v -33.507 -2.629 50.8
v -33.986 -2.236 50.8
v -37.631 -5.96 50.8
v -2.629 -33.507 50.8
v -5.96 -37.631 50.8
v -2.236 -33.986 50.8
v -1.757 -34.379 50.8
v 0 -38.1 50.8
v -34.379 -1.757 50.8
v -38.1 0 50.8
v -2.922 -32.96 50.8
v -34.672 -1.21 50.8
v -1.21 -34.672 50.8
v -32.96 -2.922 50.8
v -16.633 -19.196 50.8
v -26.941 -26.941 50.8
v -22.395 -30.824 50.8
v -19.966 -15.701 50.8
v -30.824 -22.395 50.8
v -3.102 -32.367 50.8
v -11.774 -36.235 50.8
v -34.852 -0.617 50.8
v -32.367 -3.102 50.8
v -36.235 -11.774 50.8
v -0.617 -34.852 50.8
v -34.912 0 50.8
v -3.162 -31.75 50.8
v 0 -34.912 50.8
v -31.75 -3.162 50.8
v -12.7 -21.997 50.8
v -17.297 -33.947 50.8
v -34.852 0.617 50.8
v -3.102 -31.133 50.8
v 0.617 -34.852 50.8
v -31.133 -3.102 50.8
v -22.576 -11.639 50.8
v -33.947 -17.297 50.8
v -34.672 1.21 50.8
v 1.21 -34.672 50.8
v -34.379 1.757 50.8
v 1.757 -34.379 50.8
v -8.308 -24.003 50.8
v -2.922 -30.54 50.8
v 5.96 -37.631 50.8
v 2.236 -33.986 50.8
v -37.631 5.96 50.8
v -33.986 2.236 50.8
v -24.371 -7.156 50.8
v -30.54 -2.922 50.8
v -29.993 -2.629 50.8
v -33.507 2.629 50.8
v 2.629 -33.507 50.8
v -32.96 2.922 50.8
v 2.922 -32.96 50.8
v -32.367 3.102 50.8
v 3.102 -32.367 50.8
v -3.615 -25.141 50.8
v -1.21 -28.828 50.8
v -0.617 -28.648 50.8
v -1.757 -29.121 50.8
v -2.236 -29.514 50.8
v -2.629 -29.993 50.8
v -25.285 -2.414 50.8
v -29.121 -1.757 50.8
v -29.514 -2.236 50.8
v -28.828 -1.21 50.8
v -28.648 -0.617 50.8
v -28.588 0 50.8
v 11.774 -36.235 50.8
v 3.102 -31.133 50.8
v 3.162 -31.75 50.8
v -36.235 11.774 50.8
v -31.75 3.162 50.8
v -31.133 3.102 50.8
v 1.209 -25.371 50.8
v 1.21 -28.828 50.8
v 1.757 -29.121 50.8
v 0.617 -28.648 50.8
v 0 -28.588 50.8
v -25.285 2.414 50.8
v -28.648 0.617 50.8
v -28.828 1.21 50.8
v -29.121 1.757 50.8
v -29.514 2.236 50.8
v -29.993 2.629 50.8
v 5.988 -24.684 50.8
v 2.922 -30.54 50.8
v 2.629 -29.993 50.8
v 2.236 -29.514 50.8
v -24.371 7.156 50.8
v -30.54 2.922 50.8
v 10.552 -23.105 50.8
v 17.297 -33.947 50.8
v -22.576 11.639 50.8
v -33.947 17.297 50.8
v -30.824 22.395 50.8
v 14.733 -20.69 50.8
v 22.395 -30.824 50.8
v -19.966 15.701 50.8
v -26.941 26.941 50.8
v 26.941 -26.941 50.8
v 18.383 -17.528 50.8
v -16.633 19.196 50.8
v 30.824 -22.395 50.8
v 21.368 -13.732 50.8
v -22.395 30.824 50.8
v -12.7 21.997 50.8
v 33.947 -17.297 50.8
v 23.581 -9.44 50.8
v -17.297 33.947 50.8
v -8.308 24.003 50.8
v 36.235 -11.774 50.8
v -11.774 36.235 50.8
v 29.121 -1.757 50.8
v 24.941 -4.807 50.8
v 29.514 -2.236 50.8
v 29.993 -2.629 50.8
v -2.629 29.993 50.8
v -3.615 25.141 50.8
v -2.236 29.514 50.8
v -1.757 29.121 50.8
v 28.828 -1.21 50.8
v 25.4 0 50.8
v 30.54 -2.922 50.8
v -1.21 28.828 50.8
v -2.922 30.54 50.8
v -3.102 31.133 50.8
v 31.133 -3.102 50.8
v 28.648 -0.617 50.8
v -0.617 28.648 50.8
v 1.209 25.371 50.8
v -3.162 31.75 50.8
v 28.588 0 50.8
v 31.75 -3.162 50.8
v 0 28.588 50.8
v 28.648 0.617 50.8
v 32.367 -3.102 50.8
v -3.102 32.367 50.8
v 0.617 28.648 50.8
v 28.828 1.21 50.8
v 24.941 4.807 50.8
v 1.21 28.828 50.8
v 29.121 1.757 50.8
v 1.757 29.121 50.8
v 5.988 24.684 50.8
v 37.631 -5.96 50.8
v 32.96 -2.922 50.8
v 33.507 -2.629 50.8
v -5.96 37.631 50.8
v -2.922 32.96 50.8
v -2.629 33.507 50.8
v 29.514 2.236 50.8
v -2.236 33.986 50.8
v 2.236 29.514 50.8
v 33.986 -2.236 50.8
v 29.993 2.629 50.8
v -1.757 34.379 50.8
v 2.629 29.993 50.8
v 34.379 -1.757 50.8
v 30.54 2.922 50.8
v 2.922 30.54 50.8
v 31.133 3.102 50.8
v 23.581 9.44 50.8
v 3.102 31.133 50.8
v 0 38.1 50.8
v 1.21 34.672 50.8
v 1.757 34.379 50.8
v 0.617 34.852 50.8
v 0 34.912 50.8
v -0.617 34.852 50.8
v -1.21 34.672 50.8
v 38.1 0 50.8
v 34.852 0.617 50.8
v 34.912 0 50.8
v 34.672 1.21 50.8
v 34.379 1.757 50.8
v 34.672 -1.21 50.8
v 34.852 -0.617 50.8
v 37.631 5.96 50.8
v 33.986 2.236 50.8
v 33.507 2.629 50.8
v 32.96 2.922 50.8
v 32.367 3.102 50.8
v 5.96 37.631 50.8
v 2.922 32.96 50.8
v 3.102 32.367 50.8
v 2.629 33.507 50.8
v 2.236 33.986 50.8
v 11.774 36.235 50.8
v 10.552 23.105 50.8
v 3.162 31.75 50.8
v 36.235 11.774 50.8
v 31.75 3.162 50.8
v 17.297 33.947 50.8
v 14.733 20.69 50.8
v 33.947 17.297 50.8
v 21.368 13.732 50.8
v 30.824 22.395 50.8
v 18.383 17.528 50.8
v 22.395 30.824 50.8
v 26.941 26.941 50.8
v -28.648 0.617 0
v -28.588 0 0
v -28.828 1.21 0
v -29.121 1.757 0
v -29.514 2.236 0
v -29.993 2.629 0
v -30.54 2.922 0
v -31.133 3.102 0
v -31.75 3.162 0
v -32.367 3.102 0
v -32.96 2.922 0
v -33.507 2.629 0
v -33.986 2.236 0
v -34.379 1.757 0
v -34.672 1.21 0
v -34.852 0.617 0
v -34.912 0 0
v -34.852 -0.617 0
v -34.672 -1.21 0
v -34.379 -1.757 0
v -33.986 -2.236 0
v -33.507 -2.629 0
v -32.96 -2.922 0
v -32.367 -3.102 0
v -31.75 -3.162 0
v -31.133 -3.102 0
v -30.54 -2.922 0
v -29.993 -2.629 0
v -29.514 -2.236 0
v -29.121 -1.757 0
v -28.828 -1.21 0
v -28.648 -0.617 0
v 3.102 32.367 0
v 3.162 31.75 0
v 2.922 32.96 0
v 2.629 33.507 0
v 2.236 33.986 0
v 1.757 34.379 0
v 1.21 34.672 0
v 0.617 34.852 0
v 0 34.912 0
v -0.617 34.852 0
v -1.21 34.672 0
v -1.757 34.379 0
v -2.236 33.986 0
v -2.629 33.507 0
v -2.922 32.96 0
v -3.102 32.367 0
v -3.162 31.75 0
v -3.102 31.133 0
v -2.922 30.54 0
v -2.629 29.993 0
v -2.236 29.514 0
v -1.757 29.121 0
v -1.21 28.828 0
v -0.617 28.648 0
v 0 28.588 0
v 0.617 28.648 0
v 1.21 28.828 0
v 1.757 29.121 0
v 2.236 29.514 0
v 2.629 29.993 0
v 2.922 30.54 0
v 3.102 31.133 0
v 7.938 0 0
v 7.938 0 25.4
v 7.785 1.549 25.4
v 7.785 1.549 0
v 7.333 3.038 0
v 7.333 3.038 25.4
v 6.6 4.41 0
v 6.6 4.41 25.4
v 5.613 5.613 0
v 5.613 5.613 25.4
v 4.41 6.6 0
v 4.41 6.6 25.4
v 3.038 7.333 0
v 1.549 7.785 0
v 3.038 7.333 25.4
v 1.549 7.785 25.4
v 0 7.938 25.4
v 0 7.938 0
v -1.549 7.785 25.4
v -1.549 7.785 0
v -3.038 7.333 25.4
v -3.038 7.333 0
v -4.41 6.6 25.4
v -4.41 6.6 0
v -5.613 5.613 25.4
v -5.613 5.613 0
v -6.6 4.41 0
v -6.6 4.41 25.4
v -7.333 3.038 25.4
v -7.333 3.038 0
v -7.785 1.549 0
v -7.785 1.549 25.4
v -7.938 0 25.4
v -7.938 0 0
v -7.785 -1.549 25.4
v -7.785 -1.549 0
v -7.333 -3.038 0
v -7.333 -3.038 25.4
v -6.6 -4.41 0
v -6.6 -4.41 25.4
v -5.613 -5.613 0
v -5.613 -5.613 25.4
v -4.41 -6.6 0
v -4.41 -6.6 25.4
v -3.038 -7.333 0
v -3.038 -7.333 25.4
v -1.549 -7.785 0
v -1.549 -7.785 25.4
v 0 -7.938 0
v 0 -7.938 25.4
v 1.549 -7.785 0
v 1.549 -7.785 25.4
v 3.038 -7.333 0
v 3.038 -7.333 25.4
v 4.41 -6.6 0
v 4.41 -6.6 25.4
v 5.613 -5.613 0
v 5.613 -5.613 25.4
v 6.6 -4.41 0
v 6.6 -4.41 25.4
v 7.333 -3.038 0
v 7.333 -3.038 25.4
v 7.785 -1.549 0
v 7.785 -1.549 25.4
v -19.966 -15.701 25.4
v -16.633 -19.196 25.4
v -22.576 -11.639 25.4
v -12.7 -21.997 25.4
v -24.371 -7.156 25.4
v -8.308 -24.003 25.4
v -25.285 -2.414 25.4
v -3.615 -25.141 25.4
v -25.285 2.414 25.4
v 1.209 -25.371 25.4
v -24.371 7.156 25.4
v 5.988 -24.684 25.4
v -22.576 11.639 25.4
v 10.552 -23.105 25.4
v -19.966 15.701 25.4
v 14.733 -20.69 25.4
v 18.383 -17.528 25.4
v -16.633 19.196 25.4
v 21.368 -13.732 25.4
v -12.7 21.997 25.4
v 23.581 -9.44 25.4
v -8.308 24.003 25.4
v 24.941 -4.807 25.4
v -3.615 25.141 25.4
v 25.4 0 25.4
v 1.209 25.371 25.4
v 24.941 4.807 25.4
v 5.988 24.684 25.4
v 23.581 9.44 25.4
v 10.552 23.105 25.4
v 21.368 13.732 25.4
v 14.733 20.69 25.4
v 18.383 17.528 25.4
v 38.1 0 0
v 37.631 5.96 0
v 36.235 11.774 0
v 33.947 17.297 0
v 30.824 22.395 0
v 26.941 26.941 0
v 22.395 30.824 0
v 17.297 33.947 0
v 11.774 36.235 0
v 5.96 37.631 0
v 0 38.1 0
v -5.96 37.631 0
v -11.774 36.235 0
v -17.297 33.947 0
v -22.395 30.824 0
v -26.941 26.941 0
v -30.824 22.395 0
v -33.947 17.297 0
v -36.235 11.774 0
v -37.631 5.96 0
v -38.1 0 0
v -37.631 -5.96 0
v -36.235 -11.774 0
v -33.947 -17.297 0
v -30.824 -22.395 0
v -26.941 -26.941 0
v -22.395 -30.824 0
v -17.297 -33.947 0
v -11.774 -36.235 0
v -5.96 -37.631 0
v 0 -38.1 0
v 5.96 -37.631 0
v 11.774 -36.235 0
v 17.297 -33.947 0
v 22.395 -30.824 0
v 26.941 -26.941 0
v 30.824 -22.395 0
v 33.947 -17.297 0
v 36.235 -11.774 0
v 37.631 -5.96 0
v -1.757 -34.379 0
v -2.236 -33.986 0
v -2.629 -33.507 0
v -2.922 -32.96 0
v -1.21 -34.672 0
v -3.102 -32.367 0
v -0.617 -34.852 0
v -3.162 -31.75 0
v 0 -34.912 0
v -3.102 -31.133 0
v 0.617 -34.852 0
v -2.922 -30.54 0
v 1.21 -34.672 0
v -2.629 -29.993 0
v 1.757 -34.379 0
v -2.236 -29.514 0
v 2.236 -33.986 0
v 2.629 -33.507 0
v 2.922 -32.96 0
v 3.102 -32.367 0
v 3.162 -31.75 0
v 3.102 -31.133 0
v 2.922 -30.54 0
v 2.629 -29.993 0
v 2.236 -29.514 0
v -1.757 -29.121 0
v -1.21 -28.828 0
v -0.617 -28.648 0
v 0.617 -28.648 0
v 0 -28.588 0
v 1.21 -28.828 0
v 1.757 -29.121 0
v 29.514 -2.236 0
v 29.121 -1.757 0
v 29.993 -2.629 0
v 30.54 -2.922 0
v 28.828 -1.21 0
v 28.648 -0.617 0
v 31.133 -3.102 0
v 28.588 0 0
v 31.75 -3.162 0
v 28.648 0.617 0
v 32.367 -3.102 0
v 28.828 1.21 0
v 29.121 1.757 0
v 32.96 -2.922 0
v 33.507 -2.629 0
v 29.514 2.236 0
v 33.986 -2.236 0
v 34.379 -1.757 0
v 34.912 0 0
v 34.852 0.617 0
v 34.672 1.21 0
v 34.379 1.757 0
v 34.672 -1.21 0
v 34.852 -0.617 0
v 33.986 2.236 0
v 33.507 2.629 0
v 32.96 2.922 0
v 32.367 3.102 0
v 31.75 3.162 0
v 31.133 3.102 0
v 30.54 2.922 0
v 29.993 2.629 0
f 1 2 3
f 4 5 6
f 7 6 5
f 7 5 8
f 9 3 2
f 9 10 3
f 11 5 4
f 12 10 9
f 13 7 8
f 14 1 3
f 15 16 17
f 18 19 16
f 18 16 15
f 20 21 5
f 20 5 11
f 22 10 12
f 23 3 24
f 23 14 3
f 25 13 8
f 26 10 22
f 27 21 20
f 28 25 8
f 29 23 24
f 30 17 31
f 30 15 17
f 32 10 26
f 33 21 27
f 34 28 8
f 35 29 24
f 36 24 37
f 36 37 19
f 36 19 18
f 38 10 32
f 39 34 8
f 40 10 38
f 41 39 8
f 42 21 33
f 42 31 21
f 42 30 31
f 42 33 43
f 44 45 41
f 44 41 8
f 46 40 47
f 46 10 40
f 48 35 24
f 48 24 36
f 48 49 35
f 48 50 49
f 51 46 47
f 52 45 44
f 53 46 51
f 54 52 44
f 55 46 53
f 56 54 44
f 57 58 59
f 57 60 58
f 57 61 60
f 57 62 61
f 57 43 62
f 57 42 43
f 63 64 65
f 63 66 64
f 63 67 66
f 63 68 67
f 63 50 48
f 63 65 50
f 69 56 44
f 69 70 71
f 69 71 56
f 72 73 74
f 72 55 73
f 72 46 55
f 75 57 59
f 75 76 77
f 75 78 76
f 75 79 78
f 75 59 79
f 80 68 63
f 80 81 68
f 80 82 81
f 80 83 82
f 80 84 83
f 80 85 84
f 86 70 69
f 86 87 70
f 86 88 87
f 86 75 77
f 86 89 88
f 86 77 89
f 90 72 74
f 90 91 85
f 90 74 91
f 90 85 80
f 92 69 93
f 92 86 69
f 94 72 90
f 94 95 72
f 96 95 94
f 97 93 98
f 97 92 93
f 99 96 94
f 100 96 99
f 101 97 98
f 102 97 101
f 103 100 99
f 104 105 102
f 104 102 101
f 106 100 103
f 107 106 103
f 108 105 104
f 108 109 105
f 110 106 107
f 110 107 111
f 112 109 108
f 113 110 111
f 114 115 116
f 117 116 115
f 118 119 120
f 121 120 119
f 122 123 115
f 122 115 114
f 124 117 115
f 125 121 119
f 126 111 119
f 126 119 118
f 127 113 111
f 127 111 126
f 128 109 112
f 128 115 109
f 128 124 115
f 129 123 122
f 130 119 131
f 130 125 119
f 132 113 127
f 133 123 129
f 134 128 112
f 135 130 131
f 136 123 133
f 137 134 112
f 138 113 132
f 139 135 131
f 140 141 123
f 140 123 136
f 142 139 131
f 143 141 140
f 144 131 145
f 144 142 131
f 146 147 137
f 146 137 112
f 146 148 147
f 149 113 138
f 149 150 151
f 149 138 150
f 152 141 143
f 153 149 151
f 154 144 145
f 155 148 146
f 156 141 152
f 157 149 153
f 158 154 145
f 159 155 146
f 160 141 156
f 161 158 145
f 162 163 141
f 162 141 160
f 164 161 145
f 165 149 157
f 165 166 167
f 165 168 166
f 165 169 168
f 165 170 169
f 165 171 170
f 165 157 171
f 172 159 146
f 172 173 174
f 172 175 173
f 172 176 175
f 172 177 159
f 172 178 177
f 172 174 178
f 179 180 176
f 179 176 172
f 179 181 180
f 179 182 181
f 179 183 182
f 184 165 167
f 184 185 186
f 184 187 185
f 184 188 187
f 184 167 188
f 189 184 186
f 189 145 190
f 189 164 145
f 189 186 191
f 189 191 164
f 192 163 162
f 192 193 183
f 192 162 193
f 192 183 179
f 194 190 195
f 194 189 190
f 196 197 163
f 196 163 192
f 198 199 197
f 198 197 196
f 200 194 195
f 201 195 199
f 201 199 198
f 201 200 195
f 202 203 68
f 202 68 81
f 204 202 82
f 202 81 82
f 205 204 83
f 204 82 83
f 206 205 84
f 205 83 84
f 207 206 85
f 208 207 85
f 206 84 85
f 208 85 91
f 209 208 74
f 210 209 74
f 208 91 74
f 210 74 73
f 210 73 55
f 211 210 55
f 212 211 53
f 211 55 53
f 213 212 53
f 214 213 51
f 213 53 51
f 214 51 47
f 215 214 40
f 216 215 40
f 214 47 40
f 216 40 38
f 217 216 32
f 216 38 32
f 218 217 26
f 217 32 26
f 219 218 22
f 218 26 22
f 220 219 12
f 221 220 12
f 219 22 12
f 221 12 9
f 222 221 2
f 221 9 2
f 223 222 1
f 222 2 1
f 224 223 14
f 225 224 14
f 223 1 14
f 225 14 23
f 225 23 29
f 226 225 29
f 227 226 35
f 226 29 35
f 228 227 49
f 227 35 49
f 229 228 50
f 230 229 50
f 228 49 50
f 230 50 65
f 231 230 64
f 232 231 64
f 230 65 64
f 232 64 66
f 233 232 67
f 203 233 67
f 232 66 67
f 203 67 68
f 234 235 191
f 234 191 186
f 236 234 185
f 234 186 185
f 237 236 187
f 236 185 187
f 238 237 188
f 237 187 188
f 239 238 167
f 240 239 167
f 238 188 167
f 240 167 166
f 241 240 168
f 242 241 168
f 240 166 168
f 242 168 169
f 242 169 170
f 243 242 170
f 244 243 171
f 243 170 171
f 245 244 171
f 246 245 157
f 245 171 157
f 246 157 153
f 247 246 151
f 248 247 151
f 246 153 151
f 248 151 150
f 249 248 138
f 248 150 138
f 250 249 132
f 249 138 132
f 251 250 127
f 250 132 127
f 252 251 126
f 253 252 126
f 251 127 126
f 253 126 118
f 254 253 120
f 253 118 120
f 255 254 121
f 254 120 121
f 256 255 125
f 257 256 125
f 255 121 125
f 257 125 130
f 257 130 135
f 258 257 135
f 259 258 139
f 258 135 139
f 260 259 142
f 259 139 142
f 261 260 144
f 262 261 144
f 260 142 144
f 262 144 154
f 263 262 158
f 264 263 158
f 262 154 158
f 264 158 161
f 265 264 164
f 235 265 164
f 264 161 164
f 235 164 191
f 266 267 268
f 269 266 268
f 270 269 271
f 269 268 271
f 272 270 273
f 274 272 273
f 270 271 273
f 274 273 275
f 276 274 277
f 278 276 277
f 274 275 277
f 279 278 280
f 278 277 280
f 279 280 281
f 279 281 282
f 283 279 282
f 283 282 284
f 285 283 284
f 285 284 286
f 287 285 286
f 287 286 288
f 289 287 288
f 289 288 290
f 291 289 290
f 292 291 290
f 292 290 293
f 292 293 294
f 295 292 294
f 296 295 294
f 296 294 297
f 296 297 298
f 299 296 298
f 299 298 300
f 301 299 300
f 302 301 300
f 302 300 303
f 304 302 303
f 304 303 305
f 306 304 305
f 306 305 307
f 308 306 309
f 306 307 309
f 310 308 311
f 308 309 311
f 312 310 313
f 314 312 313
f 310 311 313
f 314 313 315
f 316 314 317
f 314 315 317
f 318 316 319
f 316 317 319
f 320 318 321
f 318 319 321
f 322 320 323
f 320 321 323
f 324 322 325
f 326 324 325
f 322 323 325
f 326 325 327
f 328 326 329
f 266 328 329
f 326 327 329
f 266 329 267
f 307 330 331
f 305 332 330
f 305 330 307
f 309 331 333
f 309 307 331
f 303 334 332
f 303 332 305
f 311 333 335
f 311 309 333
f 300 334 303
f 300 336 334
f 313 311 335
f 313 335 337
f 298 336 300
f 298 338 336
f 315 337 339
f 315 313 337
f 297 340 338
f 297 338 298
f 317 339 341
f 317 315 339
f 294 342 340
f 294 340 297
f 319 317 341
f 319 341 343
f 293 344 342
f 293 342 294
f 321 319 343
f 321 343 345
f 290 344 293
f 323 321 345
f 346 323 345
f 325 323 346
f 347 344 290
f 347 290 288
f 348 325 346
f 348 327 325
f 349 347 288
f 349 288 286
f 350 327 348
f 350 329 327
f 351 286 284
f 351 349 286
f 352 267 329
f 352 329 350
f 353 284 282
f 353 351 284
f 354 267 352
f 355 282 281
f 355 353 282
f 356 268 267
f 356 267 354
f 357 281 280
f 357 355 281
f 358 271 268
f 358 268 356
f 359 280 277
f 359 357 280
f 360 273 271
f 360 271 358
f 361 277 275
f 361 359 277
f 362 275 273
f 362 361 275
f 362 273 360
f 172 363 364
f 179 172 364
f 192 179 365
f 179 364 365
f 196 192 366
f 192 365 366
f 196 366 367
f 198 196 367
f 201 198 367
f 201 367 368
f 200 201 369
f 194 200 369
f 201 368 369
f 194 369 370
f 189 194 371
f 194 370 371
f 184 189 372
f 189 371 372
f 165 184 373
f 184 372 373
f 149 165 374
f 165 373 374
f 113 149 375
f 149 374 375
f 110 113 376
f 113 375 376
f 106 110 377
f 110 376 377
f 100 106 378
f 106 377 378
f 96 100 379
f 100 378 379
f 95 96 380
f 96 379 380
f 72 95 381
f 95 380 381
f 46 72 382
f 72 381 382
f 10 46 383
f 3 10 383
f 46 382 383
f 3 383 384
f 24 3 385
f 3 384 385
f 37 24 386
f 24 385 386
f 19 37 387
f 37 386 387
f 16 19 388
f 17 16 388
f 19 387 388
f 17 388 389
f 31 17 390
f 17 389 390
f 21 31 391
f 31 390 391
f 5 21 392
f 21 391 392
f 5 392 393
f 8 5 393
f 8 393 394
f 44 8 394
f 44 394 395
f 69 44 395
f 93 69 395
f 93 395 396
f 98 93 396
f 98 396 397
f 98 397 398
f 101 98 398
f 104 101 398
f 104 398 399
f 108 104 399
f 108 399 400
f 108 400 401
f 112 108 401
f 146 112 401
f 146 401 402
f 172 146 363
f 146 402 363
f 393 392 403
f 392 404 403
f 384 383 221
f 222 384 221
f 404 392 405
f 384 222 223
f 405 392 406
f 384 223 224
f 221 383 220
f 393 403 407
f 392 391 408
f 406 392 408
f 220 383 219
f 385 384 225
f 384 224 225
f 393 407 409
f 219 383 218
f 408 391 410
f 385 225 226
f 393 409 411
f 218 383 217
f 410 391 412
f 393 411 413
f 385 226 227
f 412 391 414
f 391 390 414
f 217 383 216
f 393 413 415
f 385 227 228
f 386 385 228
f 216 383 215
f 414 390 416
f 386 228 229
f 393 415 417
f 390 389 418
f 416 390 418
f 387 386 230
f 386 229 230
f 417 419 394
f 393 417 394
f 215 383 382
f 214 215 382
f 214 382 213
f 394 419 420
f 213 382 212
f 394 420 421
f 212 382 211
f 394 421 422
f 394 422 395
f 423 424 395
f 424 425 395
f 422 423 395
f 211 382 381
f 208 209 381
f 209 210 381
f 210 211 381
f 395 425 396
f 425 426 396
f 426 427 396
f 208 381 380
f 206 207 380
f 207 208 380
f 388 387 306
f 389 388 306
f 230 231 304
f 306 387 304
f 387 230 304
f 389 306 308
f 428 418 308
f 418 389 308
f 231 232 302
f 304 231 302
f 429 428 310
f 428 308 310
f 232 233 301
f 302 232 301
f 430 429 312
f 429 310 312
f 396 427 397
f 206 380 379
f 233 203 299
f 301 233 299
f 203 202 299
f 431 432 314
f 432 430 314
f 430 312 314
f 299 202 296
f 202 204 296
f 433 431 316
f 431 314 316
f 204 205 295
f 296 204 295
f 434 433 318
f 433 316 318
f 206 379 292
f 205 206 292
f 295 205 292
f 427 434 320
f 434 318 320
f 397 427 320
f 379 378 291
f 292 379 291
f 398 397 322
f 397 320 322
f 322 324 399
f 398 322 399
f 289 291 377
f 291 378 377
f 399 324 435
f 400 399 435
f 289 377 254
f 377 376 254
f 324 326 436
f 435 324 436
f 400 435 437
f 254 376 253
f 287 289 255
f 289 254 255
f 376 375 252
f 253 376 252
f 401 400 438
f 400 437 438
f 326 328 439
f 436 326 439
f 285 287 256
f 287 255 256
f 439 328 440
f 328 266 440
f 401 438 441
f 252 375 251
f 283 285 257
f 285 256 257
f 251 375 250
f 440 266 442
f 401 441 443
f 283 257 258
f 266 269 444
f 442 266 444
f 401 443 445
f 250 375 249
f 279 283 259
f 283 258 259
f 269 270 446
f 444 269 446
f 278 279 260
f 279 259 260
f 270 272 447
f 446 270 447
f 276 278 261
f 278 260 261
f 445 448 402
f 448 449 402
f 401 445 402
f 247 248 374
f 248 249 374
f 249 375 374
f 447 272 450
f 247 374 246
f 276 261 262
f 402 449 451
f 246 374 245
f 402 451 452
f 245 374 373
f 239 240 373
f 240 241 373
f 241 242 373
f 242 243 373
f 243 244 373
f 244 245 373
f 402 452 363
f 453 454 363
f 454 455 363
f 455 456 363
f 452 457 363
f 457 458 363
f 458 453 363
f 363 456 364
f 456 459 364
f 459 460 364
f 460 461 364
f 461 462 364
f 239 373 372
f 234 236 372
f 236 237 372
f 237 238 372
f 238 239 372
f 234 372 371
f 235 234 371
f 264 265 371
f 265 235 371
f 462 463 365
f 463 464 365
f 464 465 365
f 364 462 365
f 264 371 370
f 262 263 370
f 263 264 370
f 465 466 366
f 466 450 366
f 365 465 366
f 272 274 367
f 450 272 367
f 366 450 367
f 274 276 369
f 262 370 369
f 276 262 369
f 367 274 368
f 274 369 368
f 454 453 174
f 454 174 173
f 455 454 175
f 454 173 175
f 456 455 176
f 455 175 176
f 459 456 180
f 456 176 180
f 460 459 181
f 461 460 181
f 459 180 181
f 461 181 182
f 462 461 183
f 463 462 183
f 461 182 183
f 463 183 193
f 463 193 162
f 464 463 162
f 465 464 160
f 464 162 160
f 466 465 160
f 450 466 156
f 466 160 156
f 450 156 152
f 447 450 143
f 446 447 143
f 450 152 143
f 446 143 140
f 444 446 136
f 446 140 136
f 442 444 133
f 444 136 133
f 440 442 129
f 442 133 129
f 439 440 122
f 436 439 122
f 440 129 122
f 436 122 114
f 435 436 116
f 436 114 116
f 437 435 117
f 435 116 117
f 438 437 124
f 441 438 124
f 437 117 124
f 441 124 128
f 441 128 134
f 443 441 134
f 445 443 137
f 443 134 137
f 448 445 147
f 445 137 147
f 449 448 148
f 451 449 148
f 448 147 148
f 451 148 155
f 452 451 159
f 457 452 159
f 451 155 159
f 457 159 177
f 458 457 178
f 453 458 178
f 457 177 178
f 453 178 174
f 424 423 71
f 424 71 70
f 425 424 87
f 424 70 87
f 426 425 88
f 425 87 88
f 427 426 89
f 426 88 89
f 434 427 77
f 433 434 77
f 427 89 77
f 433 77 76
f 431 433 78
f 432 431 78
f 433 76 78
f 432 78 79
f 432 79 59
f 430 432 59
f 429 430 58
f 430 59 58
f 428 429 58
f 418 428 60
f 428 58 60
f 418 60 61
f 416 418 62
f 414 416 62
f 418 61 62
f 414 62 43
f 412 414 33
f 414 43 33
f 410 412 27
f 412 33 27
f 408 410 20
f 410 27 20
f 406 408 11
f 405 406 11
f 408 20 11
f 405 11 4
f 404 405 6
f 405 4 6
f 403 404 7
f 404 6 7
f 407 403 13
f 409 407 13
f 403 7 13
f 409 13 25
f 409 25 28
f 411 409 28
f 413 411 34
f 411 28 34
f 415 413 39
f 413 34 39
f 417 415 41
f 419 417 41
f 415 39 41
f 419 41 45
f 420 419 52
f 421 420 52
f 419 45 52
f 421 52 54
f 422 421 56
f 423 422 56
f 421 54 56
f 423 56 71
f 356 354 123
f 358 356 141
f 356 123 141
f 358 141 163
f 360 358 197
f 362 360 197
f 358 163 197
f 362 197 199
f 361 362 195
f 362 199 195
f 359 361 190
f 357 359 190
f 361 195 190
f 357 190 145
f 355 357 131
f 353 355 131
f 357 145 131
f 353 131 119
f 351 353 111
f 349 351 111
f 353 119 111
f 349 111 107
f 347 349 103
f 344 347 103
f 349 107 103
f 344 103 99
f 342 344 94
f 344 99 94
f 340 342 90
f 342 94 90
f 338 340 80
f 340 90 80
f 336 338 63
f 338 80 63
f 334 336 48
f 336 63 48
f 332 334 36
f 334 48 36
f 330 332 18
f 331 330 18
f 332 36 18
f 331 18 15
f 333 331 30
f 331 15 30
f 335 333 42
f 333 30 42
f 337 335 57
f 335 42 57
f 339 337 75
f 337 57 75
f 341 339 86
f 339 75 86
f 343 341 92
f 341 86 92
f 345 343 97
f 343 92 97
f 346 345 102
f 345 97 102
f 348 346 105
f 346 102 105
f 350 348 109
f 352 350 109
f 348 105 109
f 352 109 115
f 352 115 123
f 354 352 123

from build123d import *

# Parameters (mm, degrees)
SKETCH1_R           = 38.1
BOSS_EXTRUDE1_DEPTH = 50.8
SKETCH2_R           = 7.9375
SKETCH2_R_2         = 3.1623
CUT_EXTRUDE1_DEPTH  = 50.8
SKETCH3_R           = 25.4
CUT_EXTRUDE2_DEPTH  = 25.4


with BuildPart() as part:
    # Sketch1 → Boss-Extrude1 (new body)
    with BuildSketch(Plane.XY):
        Circle(SKETCH1_R)
    extrude(amount=BOSS_EXTRUDE1_DEPTH)

    # Sketch2 → Cut-Extrude1 (cut)
    with BuildSketch(Plane.XY.offset(50.8)):
        Circle(SKETCH2_R)
        with Locations((0, 31.75)):
            Circle(SKETCH2_R_2)
        with Locations((0, -31.75)):
            Circle(SKETCH2_R_2)
        with Locations((31.75, 0)):
            Circle(SKETCH2_R_2)
        with Locations((-31.75, 0)):
            Circle(SKETCH2_R_2)
    extrude(amount=-CUT_EXTRUDE1_DEPTH, mode=Mode.SUBTRACT)

    # Sketch3 → Cut-Extrude2 (cut)
    with BuildSketch(Plane.XY.offset(50.8)):
        Circle(SKETCH3_R)
    extrude(amount=-CUT_EXTRUDE2_DEPTH, mode=Mode.SUBTRACT)


solid = part.part
